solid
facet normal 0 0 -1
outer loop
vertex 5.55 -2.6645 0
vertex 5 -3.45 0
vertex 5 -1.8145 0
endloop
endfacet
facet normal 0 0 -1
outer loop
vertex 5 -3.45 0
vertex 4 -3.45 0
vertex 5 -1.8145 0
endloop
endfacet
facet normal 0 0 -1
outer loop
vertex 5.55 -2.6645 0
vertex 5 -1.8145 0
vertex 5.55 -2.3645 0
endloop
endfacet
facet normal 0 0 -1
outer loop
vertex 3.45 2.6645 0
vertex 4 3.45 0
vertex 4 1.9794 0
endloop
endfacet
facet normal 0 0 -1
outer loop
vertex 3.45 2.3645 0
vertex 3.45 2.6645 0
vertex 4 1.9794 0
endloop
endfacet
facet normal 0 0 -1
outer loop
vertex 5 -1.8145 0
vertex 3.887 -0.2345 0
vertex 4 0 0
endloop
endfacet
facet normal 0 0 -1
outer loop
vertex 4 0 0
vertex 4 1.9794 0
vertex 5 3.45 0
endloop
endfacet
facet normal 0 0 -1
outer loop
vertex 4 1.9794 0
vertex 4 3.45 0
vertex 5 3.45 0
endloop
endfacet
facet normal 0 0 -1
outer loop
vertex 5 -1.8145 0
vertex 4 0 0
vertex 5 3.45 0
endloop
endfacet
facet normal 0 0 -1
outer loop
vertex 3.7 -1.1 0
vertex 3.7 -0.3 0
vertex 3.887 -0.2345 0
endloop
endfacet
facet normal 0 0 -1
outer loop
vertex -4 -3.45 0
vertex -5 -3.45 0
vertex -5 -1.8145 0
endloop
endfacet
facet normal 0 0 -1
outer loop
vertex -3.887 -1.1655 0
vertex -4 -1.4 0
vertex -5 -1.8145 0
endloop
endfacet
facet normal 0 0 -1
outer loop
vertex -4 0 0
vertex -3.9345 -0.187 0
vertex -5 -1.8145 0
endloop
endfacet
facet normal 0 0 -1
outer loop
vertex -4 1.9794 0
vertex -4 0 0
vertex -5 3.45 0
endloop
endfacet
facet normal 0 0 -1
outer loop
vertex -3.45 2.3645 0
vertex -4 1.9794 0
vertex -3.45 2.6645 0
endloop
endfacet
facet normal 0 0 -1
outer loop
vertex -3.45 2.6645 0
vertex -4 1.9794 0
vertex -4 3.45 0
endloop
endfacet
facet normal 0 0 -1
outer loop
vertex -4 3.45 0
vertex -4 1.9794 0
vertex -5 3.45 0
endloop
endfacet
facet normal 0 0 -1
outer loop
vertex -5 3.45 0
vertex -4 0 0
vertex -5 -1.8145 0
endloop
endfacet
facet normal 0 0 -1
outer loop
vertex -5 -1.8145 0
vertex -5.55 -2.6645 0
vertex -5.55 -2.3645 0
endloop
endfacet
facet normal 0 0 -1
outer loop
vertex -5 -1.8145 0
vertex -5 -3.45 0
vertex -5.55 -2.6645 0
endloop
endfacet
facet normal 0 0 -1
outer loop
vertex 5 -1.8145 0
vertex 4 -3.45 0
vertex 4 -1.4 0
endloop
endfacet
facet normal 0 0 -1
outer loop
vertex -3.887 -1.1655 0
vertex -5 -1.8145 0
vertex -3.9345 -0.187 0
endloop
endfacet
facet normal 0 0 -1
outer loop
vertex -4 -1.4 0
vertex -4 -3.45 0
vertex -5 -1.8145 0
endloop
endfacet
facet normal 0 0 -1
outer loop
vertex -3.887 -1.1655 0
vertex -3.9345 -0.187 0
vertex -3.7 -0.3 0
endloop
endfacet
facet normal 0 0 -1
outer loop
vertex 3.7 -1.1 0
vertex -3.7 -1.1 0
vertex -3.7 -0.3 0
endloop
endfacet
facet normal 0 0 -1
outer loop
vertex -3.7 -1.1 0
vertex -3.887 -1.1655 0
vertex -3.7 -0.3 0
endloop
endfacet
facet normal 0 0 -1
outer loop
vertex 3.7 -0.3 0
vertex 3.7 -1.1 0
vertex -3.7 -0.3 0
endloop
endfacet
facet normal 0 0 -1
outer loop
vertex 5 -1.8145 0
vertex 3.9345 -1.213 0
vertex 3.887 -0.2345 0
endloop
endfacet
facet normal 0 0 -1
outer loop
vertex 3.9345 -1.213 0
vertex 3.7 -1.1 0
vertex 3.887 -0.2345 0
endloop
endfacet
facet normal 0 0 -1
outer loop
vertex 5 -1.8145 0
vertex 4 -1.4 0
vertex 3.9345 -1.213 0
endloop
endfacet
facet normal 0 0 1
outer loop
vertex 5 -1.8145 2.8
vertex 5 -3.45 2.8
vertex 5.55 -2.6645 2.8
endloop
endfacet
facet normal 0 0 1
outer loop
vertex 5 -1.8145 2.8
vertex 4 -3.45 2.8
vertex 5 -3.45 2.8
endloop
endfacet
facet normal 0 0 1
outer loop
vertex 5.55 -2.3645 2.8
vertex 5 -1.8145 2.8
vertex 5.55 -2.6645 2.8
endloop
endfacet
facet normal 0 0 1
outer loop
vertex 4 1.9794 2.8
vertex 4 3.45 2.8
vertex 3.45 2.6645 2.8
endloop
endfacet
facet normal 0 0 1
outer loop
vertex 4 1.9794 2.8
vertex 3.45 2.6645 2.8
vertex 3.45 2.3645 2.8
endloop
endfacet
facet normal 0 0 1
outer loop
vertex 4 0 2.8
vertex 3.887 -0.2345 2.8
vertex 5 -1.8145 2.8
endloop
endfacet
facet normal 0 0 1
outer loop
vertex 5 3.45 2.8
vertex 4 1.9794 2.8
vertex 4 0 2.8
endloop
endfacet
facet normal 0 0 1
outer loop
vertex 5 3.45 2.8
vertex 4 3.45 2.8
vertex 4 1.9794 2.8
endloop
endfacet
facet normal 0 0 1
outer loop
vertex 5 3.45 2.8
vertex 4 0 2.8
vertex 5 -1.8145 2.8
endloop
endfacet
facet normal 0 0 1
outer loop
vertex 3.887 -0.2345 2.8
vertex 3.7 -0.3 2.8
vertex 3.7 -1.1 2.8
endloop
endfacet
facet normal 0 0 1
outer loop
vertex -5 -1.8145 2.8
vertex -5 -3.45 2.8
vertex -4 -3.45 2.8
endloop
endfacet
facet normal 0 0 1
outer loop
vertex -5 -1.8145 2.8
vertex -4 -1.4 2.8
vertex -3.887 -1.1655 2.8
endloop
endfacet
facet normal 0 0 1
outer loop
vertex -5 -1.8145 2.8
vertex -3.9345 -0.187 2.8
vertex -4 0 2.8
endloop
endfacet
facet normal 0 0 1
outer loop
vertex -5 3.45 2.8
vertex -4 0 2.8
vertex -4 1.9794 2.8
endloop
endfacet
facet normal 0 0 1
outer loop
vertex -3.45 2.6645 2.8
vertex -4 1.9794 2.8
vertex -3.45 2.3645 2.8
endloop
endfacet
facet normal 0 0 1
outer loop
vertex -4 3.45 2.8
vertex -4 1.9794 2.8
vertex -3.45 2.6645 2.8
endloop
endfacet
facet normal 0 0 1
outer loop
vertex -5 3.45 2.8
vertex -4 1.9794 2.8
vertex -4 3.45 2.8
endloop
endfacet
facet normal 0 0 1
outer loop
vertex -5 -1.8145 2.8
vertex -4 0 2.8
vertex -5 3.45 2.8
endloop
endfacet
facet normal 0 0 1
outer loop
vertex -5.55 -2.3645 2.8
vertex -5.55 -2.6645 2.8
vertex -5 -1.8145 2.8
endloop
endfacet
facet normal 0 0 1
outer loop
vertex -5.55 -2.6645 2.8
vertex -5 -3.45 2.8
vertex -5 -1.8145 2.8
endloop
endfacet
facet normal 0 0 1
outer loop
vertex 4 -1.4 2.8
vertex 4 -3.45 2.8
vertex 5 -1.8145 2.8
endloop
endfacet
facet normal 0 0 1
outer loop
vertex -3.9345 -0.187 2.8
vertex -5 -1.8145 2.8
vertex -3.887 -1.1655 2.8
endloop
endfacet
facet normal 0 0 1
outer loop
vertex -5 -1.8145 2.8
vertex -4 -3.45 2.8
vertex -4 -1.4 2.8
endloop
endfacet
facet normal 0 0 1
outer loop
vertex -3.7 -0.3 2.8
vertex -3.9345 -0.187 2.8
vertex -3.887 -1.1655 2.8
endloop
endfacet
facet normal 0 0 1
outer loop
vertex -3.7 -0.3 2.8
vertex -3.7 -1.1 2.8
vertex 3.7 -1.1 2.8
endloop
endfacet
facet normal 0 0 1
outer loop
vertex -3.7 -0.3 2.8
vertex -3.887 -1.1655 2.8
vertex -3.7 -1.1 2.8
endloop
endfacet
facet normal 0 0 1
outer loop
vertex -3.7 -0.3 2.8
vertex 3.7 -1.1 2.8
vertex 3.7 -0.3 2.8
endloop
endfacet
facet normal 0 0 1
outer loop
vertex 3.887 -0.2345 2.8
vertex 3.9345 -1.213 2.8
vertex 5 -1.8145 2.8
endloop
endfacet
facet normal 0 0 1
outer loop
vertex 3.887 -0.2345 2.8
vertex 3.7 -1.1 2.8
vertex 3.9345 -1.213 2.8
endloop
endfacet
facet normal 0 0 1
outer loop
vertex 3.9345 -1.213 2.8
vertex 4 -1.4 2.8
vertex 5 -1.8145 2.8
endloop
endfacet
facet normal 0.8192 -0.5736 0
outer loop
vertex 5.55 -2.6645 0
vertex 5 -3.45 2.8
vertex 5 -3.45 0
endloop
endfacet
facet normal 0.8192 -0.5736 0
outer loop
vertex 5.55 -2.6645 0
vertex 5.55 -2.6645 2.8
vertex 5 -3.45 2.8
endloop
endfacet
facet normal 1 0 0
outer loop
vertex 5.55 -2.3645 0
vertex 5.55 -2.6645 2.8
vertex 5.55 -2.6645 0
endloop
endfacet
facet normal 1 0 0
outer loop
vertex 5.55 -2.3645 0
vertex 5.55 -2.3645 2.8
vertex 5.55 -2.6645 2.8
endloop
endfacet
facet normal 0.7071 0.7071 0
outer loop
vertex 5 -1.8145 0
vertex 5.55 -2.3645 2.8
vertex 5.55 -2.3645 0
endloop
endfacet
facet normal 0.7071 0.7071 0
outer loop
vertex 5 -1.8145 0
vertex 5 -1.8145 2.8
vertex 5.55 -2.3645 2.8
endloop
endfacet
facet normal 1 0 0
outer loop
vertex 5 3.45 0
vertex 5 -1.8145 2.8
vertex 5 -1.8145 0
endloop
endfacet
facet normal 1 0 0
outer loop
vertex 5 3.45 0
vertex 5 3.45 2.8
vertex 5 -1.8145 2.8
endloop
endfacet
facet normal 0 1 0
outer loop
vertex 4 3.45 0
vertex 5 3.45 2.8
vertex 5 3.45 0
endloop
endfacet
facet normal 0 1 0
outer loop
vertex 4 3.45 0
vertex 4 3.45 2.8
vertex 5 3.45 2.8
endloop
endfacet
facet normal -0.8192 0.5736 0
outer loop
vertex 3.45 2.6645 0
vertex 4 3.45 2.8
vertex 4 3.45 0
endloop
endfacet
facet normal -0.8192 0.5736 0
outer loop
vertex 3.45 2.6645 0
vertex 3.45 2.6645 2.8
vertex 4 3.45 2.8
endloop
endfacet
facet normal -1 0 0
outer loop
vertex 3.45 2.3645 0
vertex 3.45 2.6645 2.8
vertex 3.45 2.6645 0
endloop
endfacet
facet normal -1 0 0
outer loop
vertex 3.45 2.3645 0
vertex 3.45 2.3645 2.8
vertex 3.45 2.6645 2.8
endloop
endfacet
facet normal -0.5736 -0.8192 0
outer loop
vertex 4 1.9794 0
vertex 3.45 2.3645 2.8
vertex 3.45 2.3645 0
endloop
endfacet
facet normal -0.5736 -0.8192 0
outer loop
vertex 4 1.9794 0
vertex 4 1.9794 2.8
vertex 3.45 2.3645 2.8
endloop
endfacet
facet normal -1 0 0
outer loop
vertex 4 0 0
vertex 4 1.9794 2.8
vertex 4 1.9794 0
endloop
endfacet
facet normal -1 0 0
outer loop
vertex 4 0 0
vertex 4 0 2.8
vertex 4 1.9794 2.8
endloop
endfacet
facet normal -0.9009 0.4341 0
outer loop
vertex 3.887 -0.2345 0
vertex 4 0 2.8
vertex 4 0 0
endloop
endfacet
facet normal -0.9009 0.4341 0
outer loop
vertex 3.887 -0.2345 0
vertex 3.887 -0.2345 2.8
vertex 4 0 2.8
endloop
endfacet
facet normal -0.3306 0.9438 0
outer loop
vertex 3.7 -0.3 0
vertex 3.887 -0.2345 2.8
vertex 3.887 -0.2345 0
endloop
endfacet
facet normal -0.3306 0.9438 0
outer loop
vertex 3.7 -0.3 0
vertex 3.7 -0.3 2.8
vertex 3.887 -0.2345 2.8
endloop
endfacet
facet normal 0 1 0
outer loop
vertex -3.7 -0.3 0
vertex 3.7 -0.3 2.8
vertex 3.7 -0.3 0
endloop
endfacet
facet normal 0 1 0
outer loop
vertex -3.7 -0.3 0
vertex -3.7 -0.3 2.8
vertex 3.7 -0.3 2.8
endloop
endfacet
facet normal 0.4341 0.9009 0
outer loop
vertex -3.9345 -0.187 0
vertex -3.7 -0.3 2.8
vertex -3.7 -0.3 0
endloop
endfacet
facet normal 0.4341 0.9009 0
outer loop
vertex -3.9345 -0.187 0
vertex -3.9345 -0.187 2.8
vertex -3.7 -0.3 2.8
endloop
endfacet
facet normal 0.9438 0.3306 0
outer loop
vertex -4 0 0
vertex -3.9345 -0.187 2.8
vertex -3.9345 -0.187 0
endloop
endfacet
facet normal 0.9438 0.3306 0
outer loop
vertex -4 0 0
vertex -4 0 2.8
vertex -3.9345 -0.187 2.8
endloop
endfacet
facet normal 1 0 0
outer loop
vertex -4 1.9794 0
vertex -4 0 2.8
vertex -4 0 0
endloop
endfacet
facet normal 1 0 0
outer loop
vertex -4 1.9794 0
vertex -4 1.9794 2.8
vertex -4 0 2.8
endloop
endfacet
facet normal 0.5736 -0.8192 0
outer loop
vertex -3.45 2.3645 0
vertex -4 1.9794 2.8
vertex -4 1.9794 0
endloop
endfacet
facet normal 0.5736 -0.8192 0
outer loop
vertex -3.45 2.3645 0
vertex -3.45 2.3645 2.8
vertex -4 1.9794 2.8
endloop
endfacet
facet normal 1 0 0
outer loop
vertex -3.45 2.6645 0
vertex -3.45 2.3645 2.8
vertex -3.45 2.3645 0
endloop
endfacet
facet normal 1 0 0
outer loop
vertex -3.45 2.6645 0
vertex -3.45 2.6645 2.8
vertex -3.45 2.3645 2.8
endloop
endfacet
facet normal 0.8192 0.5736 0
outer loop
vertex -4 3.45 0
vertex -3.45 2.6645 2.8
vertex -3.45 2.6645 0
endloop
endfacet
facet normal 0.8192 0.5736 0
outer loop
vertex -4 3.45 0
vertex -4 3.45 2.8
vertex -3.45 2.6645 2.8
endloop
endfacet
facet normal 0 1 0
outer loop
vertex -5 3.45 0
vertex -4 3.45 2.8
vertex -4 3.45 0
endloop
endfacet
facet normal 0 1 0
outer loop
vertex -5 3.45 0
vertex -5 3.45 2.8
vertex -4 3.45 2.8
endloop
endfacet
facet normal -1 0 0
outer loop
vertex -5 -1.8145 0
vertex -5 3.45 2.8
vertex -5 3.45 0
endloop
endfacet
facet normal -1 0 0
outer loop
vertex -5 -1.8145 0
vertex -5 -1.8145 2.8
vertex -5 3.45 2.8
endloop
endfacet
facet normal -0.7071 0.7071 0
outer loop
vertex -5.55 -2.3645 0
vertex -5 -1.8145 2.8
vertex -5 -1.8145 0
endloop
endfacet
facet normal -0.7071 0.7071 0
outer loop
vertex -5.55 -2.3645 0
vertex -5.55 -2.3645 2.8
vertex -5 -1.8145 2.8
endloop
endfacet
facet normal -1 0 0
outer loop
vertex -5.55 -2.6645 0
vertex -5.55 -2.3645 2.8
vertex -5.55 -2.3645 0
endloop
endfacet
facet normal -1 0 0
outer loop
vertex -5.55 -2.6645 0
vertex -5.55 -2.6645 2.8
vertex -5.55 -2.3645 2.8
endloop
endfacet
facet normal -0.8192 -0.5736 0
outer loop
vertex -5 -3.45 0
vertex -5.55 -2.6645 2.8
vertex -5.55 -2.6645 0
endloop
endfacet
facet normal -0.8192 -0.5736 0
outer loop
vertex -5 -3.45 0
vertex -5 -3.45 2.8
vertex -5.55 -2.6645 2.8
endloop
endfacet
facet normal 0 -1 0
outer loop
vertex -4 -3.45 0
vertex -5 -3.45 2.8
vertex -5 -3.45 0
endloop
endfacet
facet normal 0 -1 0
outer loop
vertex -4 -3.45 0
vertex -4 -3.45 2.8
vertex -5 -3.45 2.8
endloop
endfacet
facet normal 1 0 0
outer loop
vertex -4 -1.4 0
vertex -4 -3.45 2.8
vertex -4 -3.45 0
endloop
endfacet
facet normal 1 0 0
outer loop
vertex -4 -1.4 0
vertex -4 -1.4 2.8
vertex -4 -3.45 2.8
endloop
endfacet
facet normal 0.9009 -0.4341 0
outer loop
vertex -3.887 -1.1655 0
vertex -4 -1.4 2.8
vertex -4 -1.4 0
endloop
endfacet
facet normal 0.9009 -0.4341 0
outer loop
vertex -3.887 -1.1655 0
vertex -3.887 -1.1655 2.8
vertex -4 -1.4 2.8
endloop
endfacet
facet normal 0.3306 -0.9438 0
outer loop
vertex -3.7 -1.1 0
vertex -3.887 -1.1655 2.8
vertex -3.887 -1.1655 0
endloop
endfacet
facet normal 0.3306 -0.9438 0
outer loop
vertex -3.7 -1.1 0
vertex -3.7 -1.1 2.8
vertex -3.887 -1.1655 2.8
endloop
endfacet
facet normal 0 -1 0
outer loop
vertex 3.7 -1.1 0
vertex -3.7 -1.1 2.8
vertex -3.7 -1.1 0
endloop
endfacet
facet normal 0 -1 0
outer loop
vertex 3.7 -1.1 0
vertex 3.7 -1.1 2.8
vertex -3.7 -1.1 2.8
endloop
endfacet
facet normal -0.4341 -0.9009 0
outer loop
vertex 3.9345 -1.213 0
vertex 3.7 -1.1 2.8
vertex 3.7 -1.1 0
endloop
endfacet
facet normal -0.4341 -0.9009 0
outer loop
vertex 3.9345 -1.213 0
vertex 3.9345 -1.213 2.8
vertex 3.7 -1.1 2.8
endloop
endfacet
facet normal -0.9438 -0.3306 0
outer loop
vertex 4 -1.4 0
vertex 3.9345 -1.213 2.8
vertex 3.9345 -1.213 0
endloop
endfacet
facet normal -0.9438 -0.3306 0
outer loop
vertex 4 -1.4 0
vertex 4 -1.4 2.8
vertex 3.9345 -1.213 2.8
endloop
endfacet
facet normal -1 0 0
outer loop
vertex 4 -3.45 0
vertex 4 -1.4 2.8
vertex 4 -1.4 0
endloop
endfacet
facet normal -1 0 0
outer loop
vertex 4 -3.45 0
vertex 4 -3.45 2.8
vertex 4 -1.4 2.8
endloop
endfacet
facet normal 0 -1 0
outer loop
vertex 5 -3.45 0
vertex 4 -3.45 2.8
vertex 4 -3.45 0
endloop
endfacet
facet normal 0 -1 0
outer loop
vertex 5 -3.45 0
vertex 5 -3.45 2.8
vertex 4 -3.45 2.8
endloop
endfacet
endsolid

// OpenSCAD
// charm-h-pin — the loose H-shaped pin that snaps a charm onto a bracelet.
//
// Two legs and a crossbar, a hook at every leg end. The lower half pushes
// down into a pocket in a bracelet bar until the crossbar bottoms out and the
// lower hooks snap under the pocket's shoulders; the charm then pushes down
// over the upper half and the upper hooks snap into its holes. The crossbar
// ends up sunk in the bar, the charm sits flat on the bar, and the pin is not
// on show anywhere.
//
// THE TWO HALVES ARE THE SAME LENGTH BUT NOT THE SAME. The half whose hooks
// point OUTWARD goes into the bracelet; the half whose hooks point INWARD takes
// the charm.
//
// PRINT IT LYING FLAT, exactly as modelled. That is the whole trick of this
// part: the H is a 2D outline extruded `hp_t` straight up, so its hooks are
// just corners of the outline and there is nothing on it that overhangs. The
// crossbar — the spring — flexes in the plane of the bed, along its perimeters.
//
// Both halves go in the same way: the legs TURN and the crossbar bends between
// them. Into the bar, the upper legs splay out as the lower hooks go in; onto
// the charm, the upper legs splay out again and the lower hooks back off their
// shoulders a little, then everything springs home. Put the pin in the
// bracelet first, then the charm on the pin.
//
// All the geometry and every number live in lib/charm-pin.scad, beside the
// pockets and holes they have to match.

$fa = 2;
$fs = 0.3;

include <../../lib/charm-pin.scad>

copies  = 1;      // how many to lay out; `-D copies=6` for a batch
spacing = 2*(hp_uo + hp_hook) + 3;   // centre to centre, side by side

assert(copies >= 1, "copies must be at least 1");

echo(str("H-pin: ", 2*(hp_uo + hp_hook), " x ", hp_v_top - hp_v_end, " x ", hp_t,
         " mm, legs ", hp_leg_w, " wide at ", 2*hp_s, " apart; ",
         -hp_v_end, " mm into the bar, ", hp_v_top, " into the charm"));
echo(str("hooks ", hp_hook, " (", hp_defl, " past the wall), lead-in ", hp_lead,
         " deg; catch 45 deg in the bar, ", hp_catch_up, " deg in the charm;",
         " crossbar strain ", 100*hp_strain_cb, "%"));

module charm_h_pin_printed() linear_extrude(hp_t) hp_pin_2d();

for (i = [0 : copies - 1])
    translate([i * spacing, 0, 0]) charm_h_pin_printed();
